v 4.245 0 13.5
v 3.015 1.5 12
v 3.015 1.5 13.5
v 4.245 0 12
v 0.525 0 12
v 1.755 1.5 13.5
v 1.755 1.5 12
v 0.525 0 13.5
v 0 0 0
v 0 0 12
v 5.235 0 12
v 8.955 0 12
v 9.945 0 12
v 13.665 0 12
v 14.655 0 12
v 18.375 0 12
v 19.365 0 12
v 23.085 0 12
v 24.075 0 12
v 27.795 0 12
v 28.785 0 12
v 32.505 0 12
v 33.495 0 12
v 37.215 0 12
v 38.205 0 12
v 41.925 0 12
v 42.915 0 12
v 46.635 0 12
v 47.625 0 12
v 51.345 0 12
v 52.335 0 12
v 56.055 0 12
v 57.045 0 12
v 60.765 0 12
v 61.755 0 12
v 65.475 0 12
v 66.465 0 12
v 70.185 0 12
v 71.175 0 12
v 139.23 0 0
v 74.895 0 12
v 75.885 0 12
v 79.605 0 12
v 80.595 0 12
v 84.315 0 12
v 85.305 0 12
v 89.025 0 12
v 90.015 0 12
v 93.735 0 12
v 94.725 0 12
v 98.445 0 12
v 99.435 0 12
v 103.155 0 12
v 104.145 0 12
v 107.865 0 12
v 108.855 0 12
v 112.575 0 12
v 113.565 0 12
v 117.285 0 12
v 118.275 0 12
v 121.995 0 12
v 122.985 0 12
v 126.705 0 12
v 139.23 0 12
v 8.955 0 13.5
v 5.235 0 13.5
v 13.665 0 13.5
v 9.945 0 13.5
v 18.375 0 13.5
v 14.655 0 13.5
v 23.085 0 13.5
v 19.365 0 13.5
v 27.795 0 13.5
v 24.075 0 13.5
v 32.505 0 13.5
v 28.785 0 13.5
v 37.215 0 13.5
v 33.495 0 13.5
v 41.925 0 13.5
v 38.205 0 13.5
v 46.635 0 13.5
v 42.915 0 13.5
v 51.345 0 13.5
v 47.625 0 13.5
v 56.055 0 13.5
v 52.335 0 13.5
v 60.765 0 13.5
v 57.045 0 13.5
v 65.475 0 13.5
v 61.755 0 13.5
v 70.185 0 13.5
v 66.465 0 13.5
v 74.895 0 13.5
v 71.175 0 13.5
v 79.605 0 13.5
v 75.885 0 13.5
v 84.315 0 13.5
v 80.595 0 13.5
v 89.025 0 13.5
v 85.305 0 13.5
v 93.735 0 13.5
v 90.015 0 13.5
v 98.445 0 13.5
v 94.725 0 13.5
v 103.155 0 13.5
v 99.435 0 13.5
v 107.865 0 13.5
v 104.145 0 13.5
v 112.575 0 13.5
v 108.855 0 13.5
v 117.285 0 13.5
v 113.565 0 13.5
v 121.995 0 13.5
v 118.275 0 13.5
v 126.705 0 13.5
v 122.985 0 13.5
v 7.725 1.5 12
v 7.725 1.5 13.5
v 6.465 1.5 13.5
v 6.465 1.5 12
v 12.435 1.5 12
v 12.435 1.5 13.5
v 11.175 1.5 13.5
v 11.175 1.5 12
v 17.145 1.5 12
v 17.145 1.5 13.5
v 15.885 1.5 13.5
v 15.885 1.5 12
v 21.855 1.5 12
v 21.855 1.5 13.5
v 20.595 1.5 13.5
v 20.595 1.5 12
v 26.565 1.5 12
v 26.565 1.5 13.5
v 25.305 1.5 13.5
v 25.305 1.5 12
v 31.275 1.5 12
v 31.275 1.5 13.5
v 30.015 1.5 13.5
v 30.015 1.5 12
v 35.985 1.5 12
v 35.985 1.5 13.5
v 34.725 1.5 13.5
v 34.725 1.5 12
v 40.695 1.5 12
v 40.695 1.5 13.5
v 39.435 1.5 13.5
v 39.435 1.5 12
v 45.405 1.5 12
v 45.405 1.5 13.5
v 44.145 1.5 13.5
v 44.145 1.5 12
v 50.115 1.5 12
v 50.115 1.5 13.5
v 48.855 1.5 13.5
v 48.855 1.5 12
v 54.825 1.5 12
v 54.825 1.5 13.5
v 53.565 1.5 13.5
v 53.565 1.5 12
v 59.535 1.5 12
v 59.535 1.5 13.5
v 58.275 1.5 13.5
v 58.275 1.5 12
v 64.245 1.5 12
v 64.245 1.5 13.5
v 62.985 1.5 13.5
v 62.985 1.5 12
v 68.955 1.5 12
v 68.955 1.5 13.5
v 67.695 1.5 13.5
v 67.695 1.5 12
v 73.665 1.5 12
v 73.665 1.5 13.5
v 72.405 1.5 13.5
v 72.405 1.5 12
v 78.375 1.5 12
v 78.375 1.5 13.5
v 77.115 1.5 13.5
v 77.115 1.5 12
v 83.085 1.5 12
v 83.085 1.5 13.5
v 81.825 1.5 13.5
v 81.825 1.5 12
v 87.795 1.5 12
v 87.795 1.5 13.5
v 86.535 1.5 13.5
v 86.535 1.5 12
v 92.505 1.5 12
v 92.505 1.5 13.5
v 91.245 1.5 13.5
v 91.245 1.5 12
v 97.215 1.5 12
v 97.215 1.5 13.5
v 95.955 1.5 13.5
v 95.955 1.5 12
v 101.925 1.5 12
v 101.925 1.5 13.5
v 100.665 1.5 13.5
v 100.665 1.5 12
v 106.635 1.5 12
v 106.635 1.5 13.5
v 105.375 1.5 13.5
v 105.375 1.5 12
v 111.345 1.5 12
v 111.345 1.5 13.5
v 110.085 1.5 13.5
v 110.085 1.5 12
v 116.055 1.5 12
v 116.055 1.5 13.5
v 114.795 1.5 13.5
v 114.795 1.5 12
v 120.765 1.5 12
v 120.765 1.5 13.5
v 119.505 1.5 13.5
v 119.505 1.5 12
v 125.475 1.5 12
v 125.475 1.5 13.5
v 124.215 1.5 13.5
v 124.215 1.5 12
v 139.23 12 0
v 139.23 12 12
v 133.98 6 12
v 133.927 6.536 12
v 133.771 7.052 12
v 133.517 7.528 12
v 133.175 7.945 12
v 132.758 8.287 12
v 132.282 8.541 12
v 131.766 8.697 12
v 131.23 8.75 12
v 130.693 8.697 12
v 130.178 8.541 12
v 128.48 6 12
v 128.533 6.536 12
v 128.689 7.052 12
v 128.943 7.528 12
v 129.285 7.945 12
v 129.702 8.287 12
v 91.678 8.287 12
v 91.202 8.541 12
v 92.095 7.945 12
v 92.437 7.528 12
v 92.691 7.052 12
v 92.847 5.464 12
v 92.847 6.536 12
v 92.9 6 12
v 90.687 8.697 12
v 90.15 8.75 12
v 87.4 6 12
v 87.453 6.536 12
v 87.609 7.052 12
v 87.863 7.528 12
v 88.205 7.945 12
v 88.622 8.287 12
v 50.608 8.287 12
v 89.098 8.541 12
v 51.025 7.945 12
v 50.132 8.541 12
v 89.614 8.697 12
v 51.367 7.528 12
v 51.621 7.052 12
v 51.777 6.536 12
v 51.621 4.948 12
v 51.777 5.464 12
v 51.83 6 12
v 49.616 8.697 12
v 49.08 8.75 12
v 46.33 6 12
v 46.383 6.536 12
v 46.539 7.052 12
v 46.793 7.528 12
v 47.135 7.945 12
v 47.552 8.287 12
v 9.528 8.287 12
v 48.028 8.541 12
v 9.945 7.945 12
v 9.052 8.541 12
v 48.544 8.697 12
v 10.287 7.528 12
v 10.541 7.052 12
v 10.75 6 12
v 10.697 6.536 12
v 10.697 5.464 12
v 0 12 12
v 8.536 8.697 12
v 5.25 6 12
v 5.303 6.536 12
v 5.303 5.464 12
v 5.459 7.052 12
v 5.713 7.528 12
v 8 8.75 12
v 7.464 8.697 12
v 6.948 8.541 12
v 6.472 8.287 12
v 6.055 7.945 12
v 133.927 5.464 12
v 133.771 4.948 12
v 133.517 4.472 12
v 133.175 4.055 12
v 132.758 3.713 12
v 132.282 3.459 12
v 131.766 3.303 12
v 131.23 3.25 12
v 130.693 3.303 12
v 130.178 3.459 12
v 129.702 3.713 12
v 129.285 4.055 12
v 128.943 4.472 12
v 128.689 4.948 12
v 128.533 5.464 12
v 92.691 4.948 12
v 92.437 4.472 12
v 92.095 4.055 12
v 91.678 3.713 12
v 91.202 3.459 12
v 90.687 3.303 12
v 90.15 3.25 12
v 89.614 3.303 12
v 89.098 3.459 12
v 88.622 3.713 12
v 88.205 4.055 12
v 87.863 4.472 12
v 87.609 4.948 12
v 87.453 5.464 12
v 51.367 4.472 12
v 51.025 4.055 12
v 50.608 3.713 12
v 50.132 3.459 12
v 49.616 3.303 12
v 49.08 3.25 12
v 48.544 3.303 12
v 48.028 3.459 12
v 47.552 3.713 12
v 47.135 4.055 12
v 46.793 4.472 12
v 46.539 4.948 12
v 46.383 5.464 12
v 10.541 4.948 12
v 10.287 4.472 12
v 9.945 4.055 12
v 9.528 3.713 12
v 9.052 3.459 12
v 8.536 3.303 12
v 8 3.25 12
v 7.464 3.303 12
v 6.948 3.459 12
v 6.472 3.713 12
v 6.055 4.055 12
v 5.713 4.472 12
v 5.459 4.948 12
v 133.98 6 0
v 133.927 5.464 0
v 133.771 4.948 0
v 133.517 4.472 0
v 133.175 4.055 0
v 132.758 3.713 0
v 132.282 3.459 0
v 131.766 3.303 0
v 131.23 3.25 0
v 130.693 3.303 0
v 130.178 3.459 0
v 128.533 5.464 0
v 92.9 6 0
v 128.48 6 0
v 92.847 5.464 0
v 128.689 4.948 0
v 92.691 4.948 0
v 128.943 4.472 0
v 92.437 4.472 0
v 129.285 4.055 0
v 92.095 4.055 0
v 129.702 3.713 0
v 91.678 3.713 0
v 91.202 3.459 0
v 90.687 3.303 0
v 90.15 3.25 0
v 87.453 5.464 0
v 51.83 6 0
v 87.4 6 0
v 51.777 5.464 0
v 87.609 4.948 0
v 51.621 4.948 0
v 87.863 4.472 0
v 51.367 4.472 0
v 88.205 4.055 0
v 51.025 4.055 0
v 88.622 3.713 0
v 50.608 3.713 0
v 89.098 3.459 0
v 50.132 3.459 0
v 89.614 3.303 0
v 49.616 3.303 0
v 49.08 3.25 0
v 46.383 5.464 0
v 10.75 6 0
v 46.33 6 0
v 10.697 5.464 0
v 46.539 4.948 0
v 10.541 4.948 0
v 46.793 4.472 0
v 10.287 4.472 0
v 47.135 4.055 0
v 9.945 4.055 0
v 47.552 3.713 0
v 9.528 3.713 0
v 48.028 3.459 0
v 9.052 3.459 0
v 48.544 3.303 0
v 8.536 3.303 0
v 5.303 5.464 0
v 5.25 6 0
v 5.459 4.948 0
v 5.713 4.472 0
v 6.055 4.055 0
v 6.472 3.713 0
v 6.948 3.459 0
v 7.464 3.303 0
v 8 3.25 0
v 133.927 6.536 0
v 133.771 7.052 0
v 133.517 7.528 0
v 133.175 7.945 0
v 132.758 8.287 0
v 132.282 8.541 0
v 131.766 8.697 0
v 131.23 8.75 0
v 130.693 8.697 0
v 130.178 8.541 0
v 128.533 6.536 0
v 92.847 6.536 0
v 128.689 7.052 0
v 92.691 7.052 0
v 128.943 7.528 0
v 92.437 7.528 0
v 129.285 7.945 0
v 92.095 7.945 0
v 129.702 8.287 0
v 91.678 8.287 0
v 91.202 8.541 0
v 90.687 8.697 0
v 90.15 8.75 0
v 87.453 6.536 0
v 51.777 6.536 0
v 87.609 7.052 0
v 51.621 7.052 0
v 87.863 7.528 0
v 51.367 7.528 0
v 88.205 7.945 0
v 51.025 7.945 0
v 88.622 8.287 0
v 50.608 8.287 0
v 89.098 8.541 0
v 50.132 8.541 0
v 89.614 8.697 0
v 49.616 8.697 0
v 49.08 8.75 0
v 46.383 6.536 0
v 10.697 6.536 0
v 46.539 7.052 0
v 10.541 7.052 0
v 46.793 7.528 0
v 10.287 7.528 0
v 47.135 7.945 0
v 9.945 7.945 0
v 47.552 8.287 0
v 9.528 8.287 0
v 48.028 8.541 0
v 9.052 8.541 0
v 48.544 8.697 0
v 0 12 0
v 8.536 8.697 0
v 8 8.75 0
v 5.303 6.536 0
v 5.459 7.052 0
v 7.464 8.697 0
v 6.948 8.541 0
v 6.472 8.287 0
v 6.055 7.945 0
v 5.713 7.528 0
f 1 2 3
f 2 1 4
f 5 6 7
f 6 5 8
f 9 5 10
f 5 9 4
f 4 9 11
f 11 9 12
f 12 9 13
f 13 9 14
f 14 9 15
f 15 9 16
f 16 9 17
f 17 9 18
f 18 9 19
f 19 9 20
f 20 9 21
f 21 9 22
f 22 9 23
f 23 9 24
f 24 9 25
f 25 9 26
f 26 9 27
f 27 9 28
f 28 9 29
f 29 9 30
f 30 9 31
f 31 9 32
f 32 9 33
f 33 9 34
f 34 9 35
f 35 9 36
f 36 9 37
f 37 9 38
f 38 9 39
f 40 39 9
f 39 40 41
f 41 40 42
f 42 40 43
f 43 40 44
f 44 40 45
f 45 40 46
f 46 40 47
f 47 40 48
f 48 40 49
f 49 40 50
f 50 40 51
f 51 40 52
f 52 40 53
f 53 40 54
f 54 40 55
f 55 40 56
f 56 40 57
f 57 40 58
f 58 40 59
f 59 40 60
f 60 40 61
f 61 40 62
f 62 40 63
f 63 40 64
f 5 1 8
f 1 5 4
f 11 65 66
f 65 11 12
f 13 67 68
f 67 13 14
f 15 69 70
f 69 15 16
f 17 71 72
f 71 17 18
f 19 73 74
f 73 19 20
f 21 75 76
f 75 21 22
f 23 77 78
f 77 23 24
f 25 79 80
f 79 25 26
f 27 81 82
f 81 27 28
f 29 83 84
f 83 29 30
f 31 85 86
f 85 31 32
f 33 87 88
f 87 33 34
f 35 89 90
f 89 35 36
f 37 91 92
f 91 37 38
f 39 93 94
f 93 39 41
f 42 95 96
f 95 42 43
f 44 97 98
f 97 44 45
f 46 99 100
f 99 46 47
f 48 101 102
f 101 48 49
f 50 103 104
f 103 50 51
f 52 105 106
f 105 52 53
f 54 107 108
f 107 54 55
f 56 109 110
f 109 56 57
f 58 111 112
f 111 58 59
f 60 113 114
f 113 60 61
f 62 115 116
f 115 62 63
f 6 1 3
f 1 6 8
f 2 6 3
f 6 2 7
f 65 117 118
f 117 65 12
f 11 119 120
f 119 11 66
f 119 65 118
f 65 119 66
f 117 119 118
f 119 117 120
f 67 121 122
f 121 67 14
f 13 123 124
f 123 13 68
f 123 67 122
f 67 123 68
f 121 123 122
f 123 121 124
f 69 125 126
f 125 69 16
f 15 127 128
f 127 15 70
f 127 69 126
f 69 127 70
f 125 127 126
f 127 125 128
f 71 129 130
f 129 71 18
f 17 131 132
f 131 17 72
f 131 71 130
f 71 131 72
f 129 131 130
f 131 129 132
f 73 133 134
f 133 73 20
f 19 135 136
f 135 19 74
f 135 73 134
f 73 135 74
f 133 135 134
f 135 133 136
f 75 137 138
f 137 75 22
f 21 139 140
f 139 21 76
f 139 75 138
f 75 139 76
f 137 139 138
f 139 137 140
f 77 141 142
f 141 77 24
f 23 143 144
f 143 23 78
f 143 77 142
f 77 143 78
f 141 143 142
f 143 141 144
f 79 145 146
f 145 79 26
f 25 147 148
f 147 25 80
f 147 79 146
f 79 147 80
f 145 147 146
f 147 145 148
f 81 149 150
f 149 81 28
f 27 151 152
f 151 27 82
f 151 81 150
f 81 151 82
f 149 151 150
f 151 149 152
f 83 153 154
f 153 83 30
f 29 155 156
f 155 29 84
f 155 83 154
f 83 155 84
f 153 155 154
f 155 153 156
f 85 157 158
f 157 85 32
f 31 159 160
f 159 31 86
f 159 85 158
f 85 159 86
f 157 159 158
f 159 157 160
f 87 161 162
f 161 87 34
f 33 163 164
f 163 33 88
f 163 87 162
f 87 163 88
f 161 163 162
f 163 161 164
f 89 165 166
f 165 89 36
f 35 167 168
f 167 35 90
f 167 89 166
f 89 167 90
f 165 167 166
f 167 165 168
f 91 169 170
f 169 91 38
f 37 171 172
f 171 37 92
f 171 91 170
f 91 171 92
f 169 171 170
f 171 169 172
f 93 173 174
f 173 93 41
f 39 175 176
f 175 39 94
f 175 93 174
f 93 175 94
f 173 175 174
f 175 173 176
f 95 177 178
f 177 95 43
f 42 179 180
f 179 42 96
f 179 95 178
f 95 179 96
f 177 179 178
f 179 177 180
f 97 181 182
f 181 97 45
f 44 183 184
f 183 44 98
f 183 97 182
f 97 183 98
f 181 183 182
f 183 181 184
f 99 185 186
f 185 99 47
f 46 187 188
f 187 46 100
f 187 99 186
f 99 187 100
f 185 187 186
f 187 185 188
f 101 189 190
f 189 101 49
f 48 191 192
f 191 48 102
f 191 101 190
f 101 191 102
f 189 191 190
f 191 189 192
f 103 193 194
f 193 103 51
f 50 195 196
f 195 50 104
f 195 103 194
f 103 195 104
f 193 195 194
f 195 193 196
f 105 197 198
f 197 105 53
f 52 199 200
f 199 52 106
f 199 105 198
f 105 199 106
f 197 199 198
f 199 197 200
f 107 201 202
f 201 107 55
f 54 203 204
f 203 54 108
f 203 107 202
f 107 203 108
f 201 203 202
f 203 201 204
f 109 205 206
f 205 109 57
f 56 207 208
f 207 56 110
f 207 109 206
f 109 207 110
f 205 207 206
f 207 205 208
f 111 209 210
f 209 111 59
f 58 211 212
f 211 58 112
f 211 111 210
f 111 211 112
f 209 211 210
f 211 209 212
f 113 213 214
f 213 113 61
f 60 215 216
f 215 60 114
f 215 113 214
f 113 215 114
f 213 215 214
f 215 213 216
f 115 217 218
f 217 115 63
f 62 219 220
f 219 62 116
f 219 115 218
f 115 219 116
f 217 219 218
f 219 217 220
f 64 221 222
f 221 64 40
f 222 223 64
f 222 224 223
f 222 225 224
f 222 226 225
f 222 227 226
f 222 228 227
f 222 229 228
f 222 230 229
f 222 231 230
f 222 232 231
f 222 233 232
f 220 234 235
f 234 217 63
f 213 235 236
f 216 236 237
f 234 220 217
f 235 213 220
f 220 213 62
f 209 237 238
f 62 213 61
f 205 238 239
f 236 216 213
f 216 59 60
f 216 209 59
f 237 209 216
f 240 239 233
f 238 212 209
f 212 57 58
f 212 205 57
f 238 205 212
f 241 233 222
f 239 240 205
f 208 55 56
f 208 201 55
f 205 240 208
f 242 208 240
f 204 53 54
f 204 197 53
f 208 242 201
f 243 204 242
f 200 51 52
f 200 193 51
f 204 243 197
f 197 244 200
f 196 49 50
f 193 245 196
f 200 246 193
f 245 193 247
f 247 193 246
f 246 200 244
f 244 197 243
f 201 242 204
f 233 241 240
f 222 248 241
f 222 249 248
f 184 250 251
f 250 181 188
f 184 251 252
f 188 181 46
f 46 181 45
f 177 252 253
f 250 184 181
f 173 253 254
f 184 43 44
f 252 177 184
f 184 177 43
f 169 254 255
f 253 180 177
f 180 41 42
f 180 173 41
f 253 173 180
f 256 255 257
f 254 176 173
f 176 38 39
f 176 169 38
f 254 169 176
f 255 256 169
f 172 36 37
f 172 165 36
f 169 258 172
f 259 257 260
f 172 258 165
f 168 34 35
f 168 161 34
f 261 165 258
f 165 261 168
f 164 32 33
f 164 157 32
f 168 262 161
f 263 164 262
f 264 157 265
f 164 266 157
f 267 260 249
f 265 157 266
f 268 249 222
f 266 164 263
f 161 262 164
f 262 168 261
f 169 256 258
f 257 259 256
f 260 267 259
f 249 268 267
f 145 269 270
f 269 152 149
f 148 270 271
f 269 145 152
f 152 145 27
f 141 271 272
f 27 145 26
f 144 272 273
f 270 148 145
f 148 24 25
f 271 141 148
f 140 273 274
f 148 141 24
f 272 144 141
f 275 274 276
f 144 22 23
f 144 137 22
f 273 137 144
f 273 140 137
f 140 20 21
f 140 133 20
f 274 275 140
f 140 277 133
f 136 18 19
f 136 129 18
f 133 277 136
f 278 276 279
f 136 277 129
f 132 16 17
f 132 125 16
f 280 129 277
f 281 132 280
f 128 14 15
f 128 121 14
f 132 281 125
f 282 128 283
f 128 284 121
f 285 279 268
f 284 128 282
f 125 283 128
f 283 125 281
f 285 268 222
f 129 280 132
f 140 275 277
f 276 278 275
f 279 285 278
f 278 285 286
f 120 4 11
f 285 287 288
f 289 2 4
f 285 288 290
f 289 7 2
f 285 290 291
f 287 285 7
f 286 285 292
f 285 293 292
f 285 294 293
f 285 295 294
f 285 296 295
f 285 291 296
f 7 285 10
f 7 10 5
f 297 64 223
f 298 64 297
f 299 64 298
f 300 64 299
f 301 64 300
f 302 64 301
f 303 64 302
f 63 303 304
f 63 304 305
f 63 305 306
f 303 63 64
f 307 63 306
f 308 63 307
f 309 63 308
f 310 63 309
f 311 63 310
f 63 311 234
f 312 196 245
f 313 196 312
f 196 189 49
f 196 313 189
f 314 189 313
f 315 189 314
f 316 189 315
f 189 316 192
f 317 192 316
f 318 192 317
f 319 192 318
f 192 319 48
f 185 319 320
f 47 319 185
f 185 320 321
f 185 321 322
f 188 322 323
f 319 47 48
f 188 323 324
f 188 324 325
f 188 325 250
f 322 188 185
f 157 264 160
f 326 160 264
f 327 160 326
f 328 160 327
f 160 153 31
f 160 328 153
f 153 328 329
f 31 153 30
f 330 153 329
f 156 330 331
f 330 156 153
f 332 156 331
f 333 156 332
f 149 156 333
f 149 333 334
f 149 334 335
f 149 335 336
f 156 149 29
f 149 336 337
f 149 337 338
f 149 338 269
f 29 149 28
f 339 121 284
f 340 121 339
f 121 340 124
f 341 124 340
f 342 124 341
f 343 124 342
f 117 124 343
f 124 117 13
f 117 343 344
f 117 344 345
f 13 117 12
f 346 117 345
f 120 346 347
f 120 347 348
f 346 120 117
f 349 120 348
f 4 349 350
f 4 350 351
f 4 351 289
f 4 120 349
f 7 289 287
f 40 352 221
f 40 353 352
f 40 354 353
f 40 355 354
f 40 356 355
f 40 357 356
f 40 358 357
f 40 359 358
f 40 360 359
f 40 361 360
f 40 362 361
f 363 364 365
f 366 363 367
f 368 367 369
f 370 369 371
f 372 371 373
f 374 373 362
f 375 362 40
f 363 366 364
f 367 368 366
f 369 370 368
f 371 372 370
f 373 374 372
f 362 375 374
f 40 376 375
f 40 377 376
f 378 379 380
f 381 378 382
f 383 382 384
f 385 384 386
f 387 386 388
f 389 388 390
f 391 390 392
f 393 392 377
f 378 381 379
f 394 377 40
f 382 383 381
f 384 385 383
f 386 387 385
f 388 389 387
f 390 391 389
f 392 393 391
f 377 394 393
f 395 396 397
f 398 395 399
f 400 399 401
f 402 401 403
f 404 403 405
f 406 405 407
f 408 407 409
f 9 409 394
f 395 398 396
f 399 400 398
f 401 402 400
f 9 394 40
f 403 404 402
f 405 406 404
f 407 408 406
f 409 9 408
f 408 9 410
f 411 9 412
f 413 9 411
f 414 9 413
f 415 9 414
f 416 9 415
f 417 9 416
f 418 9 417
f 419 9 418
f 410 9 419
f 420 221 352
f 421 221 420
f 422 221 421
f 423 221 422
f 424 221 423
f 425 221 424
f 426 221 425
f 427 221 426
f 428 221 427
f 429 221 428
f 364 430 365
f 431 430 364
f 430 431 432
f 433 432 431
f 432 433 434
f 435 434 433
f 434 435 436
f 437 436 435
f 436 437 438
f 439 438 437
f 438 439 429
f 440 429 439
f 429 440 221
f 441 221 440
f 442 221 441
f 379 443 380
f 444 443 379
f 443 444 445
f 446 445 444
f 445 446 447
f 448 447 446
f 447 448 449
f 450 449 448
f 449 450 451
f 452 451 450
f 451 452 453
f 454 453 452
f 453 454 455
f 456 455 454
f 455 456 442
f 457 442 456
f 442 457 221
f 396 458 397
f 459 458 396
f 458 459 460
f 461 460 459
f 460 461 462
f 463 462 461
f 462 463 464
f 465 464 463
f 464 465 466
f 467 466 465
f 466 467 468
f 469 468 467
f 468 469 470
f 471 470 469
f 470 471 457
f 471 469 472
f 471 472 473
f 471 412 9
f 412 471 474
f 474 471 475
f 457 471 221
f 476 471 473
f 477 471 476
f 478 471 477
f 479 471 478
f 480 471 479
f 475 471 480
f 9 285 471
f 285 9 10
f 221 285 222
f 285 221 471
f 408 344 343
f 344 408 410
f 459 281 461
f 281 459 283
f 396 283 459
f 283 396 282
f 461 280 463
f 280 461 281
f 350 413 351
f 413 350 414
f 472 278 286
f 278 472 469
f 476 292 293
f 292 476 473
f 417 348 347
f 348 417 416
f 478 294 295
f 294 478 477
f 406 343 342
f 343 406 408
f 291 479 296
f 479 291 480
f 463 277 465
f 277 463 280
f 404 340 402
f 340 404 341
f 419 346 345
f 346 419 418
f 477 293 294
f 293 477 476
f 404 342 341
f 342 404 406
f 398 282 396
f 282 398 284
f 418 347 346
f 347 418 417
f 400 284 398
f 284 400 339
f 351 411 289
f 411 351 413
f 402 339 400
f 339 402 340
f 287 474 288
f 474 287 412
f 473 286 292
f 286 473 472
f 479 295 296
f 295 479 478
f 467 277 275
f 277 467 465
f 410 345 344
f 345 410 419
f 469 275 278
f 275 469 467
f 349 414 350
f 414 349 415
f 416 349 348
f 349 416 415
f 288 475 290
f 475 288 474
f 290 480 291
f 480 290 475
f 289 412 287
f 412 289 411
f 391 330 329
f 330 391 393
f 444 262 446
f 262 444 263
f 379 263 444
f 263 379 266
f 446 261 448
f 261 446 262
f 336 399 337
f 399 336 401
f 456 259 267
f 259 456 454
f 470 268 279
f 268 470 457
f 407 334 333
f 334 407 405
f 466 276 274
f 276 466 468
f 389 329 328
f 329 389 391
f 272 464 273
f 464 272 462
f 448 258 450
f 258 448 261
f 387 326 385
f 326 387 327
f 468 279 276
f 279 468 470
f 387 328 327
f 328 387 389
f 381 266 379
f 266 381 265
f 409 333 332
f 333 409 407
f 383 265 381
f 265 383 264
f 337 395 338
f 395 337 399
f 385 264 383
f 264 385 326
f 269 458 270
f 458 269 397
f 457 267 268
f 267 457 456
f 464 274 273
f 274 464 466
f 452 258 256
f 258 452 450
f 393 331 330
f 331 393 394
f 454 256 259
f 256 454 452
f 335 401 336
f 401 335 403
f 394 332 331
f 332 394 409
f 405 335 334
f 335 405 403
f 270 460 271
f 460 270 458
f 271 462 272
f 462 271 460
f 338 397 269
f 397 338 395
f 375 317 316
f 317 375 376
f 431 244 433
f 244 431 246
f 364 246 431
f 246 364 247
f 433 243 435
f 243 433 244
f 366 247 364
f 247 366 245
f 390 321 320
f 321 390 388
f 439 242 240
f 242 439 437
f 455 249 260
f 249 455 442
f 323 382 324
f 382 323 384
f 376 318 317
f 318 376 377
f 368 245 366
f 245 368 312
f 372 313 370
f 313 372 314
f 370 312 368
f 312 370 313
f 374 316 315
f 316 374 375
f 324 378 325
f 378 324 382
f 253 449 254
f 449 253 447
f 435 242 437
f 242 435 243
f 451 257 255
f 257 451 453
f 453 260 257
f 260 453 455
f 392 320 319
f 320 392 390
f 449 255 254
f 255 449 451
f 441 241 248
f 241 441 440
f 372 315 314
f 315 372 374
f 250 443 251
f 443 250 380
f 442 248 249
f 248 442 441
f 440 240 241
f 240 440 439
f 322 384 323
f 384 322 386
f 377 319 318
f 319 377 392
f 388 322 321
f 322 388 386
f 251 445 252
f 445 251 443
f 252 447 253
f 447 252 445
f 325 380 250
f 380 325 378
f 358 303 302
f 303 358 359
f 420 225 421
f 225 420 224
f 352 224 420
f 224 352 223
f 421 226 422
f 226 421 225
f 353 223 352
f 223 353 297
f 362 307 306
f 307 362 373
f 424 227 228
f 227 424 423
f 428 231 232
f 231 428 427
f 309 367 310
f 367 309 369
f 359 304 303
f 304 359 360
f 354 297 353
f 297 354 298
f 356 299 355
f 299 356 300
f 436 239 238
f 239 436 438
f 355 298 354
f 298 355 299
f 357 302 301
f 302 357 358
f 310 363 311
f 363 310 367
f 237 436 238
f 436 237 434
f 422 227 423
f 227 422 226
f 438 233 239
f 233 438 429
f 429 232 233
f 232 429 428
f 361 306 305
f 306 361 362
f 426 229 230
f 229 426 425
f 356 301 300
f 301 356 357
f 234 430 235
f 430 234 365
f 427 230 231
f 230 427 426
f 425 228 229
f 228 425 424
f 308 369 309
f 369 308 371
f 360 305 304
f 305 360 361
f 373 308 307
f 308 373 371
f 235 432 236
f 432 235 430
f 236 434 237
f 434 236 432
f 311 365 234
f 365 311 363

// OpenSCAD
$fn = 32;

// ----------------------------------------------------------------------
// Gear rack: m=1.5 z=27, 139.23 x 12 x 13.5 mm
// ----------------------------------------------------------------------

// --- parameters (mm) ---
length = 139.23;          // rack length, X
width = 12;               // rack width, Y
height = 13.5;            // overall height, Z
module_m = 1.5;           // module
back_t = 12;              // tooth root line height
pitch = 4.71;             // circular pitch
tip_w = 1.26;             // tooth thickness at the tip
root_w = 3.72;            // tooth thickness at the root line
hole_d = 5.5;             // mounting hole
sink = 0.6;               // tooth root overlap into the body

tooth_span = 127.23;

module tooth(x0) {
  /* 20 deg flank profile, sunk into the body for a positive overlap */
  translate([x0, 0, back_t - sink])
    linear_extrude(height = height - back_t + sink)
      polygon(points = [[-root_w / 2, 0], [root_w / 2, 0],
                        [tip_w / 2, height - back_t],
                        [-tip_w / 2, height - back_t]]);
}

difference() {
  union() {
    cube([length, width, back_t]);
    for (i = [0 : 27 - 1])
      tooth((i + 0.5) * pitch + (tooth_span - 27 * pitch) / 2);
  }
  translate([8, 6, -1]) cylinder(h = back_t + 2, d = hole_d);
  translate([49.08, 6, -1]) cylinder(h = back_t + 2, d = hole_d);
  translate([90.15, 6, -1]) cylinder(h = back_t + 2, d = hole_d);
  translate([131.23, 6, -1]) cylinder(h = back_t + 2, d = hole_d);
}
